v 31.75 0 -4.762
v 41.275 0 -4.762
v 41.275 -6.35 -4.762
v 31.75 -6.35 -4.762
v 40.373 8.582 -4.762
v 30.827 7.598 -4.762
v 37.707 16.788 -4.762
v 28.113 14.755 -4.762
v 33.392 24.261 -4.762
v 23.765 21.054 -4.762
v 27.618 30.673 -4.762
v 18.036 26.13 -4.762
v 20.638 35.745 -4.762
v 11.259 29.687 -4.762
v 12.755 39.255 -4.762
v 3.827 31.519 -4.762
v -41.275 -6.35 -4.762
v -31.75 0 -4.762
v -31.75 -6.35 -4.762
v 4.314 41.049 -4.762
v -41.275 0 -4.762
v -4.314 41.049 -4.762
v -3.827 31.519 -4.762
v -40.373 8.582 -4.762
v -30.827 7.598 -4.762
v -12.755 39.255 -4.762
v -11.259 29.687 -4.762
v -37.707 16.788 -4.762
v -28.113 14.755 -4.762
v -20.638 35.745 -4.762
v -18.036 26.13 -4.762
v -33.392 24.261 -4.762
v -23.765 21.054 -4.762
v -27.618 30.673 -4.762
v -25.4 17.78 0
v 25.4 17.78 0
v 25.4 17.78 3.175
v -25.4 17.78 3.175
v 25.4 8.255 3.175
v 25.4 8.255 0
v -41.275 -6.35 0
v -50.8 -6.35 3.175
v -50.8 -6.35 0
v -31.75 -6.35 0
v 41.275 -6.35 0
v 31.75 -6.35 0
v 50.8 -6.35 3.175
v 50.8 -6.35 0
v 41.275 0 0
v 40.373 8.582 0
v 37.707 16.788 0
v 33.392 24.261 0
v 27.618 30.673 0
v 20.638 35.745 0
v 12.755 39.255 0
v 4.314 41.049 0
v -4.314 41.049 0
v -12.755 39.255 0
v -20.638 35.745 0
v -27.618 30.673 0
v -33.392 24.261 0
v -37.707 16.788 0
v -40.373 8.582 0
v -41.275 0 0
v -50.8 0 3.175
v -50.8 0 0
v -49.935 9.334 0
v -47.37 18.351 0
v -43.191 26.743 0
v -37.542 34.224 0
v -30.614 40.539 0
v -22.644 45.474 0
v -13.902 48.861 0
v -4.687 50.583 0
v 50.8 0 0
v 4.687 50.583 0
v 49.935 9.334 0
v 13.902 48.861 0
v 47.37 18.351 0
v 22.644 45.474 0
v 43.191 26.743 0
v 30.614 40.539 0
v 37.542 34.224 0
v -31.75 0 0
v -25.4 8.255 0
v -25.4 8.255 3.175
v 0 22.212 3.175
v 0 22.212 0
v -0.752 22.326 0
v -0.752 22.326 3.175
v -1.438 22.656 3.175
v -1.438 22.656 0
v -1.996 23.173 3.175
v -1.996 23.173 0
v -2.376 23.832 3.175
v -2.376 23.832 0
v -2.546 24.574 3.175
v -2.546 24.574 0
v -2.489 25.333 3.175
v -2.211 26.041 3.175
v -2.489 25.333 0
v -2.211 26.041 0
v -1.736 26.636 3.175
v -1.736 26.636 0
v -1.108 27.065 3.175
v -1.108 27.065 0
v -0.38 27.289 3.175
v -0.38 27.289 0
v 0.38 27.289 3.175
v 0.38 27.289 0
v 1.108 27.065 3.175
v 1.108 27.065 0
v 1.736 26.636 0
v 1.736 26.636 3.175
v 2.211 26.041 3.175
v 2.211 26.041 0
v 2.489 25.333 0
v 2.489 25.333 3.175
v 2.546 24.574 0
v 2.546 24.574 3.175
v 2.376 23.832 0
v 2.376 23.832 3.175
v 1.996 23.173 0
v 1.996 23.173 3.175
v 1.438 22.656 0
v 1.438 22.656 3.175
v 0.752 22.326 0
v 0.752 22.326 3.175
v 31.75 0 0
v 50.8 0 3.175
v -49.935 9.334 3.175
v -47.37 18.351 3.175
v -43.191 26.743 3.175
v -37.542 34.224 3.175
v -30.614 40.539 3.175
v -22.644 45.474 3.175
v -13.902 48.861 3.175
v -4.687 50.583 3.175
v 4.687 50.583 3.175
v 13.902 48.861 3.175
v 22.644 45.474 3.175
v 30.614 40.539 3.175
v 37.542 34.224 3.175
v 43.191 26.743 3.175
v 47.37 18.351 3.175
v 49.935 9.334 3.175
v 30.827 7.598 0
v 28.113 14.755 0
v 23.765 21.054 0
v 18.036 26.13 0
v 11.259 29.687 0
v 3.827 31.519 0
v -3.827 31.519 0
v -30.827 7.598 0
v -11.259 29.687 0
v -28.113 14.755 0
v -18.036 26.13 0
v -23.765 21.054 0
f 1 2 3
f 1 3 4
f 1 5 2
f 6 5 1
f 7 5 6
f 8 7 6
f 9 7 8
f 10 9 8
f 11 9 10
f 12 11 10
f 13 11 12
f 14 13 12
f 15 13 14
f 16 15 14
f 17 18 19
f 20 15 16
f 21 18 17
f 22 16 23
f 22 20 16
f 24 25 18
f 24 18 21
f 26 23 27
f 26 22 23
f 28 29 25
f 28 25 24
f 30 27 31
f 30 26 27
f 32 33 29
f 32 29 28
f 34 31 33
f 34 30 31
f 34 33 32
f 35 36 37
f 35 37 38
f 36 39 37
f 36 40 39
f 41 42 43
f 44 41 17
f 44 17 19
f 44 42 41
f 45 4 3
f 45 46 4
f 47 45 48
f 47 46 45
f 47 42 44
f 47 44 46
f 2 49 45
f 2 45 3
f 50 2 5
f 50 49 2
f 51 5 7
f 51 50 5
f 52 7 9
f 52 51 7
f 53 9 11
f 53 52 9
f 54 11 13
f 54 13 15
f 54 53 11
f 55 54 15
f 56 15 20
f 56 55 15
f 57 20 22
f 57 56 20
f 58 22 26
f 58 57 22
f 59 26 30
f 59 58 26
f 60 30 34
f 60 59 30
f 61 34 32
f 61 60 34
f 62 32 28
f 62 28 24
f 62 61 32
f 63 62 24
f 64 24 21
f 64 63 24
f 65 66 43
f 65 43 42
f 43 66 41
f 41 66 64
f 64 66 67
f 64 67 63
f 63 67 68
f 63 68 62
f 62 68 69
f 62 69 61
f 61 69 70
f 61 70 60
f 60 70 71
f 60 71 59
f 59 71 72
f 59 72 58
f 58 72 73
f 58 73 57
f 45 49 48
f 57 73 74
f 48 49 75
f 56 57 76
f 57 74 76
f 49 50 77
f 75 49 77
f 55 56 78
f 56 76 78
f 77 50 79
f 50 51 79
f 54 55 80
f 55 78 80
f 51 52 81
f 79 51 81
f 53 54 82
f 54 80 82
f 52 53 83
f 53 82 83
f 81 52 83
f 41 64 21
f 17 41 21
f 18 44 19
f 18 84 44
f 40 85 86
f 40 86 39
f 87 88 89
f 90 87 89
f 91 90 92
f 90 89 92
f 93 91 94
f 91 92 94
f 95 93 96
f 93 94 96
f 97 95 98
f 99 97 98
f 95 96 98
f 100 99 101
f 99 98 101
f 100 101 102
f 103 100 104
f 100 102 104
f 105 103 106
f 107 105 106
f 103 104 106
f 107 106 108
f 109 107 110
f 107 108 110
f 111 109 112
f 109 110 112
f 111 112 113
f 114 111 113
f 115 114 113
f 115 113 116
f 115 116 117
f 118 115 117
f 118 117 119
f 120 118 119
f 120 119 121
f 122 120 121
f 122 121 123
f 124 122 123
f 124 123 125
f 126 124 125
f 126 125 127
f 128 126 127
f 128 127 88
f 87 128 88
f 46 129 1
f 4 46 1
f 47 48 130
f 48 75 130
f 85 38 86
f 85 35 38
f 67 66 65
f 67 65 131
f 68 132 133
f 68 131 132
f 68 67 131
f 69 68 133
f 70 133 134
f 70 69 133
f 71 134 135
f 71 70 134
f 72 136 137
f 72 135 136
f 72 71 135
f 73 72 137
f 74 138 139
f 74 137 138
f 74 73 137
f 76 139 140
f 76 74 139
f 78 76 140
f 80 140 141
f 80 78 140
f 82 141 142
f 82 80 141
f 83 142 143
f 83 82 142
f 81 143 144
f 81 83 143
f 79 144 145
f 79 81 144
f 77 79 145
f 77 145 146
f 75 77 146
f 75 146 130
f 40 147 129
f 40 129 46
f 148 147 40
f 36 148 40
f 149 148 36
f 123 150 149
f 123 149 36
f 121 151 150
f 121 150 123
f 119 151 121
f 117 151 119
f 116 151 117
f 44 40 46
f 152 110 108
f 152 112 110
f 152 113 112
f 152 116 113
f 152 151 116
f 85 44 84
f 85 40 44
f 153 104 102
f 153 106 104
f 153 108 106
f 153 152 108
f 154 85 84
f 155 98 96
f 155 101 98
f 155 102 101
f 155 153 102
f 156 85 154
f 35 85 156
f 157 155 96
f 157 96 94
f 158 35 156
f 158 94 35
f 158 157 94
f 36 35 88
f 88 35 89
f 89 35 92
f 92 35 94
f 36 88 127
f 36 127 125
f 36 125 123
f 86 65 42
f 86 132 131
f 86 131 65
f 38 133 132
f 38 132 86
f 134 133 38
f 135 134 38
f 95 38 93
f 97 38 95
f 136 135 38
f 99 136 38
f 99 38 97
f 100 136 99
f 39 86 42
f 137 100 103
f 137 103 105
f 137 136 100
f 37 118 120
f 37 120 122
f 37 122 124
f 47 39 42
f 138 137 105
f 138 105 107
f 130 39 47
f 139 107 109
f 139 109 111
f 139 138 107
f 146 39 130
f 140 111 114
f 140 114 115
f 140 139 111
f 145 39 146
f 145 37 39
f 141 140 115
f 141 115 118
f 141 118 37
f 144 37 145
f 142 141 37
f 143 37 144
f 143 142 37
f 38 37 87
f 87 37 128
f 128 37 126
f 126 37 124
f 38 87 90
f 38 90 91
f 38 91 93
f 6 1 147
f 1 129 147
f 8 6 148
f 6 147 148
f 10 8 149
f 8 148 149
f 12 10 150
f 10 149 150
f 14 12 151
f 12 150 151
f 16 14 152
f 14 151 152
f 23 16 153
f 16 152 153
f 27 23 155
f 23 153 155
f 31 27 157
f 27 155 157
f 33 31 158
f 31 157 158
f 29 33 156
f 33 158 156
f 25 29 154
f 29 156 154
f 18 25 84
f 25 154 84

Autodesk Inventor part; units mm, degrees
ref_plane "YZ Plane" through (0, 0, 0) normal (1, 0, 0) x (0, 1, 0)
ref_plane "XZ Plane" through (0, 0, 0) normal (0, 1, 0) x (-1, 0, 0)
ref_plane "XY Plane" through (0, 0, 0) normal (0, 0, 1) x (1, 0, 0)
sketch "Sketch2" plane through (0, 0, 0) normal (0, 0, 1) x (1, 0, 0)
  arc A0 (31.75, 0) -> (-31.75, 0) centre (0, 0) ccw
  arc A1 (41.275, 0) -> (-41.275, 0) centre (0, 0) ccw
  line L0 (-41.275, 0) -> (-31.75, 0)
  line L1 (31.75, 0) -> (41.275, 0)
  arc A2 (50.8, 0) -> (-50.8, 0) centre (0, 0) ccw
  line L2 (-50.8, 0) -> (-41.275, 0)
  line L3 (41.275, 0) -> (50.8, 0)
  line L4 (-31.75, 0) -> (31.75, 0)
  line L5 (0, 0) -> (0, 31.75) construction
  line L6 (0, 8.255) -> (25.4, 8.255)
  line L7 (25.4, 8.255) -> (25.4, 17.78)
  line L8 (25.4, 17.78) -> (0, 17.78)
  line L9 (0, 17.78) -> (-25.4, 17.78)
  line L10 (-25.4, 17.78) -> (-25.4, 8.255)
  line L11 (-25.4, 8.255) -> (0, 8.255)
  dimension "d2" = 63.5
  dimension "d3" = 9.525
  dimension "d4" = 9.525
  dimension "d5" = 25.4
  dimension "d6" = 8.255
  dimension "d7" = 9.525
extrude "Extrusion3" add sketch "Sketch2" along normal blind 3.175
extrude "Extrusion4" add sketch "Sketch2" against normal blind 4.7625 contours A0 L0 A1 L1
sketch "Sketch5" plane through (0, 0, 3.175) normal (0, 0, 1) x (1, 0, 0)
  arc A0 (31.75, 0) -> (-31.75, 0) centre (0, 0) ccw projected
  line L0 (-25.4, 17.78) -> (25.4, 17.78) projected
  line L1 (0, 31.75) -> (0, 17.78) construction
  point P0 (0, 24.765)
hole "Hole2" at (0, 24.765, 3.175) direction (0, 0, -1) diameter 5.1054 end through all clearance for "Socket Head Cap Screw" size "#10" standard "Ansi Unified Screw Threads"
sketch "Sketch8" plane through (-50.8, 0, 3.175) normal (0, -1, 0) x (1, 0, 0)
  line L0 (101.6, -3.175) -> (101.6, 0) projected
  line L1 (101.6, 0) -> (101.6, -3.175)
  line L2 (92.075, -3.175) -> (101.6, -3.175) projected
  line L3 (101.6, -3.175) -> (92.075, -3.175)
  line L4 (92.075, -7.9375) -> (82.55, -7.9375) projected
  line L5 (92.075, -3.175) -> (92.075, -7.9375)
  line L6 (92.075, -7.9375) -> (82.55, -7.9375)
  line L7 (82.55, -3.175) -> (82.55, -7.9375) projected
  line L8 (82.55, -7.9375) -> (82.55, -3.175)
  line L9 (82.55, -3.175) -> (19.05, -3.175)
  line L10 (19.05, -3.175) -> (19.05, -7.9375) projected
  line L11 (19.05, -3.175) -> (19.05, -7.9375)
  line L12 (9.525, -7.9375) -> (92.075, -7.9375) projected
  line L13 (19.05, -7.9375) -> (9.525, -7.9375)
  line L14 (9.525, -3.175) -> (9.525, -7.9375) projected
  line L15 (9.525, -7.9375) -> (9.525, -3.175)
  line L16 (0, -3.175) -> (9.525, -3.175) projected
  line L17 (9.525, -3.175) -> (0, -3.175)
  line L18 (0, -3.175) -> (0, 0) projected
  line L19 (0, -3.175) -> (0, 0)
  line L20 (0, 0) -> (101.6, 0)
  point P0 (50.8, -3.175)
extrude "Extrusion6" add sketch "Sketch8" along normal blind 6.35 contours L2 L5 L4 L7 L9 L10 L12 L14 L16 L18 L20 L0
equation "\"d2\" = insideDiameterOfRing"
equation "\"d3\" = innerRingWidth"
equation "\"d4\" = outerRingWidth"
equation "\"d5\" = halfWidthForPryBar"
equation "\"d6\" = distanceFromEdgeToPryBar"
equation "\"d7\" = depthForPryBar"
equation "\"d12\" = bottomFlat"
equation "\"d14\" = bottomSupport"
equation "\"insideDiameterOfRing\" = 63.5"
equation "\"wallThicknessOfRing\" = 9.525"
equation "\"outsideDiameterOfRing\" = insideDiameterOfRing + 2 * wallThicknessOfRing"
equation "\"widthForPryBar\" = 50.8"
equation "\"outerRingWidth\" = 9.525"
equation "\"innerRingWidth\" = 9.525"
equation "\"halfWidthForPryBar\" = 0.5 * widthForPryBar"
equation "\"distanceFromEdgeToPryBar\" = 8.255"
equation "\"totalHeightOfPart\" = 19.05"
equation "\"topPartHeight\" = 6.35"
equation "\"lowerPartHeight\" = totalHeightOfPart - topPartHeight"
equation "\"depthForPryBar\" = 9.525"
equation "\"bottomFlat\" = 3.175"
equation "\"bottomSupport\" = 4.7625"
properties part number "dRingHolderBottom" material "PBT Plastic"
